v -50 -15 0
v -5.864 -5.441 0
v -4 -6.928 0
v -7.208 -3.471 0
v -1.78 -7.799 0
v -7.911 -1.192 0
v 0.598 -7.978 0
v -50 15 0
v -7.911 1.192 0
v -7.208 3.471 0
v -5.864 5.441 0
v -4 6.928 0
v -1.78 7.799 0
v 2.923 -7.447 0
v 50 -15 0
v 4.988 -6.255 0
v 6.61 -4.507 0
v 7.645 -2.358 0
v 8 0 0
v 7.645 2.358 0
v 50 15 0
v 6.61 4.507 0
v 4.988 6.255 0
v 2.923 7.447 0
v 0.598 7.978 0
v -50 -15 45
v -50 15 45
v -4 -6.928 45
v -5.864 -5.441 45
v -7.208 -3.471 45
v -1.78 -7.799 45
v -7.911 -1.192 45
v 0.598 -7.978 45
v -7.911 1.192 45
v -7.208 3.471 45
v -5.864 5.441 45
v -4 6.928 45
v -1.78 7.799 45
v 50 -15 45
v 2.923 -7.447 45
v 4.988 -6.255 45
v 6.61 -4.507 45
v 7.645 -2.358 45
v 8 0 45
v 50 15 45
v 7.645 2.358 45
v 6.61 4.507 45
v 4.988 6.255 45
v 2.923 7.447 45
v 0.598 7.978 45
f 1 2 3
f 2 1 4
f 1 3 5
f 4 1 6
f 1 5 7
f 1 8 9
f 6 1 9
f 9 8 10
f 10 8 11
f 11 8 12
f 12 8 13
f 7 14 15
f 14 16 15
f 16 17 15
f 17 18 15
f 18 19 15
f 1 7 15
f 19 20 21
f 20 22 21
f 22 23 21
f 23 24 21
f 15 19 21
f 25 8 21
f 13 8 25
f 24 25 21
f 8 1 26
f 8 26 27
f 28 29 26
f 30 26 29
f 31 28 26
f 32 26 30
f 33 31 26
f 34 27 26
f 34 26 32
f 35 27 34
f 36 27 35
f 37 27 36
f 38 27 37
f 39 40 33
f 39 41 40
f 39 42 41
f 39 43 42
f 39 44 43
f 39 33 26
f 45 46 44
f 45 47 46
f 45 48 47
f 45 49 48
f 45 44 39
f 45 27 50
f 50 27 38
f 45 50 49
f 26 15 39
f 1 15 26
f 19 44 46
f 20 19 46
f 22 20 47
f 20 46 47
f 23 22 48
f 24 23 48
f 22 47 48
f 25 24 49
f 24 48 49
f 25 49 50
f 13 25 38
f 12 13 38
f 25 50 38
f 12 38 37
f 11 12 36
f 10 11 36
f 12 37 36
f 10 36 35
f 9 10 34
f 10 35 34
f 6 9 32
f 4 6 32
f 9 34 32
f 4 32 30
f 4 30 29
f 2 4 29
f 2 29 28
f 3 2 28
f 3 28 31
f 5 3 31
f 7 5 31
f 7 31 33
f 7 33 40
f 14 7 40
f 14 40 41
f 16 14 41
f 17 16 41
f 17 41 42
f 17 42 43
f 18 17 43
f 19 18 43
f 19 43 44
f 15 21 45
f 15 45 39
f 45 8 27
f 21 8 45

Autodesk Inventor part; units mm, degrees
ref_plane "YZ Plane" through (0, 0, 0) normal (1, 0, 0) x (0, 1, 0)
ref_plane "XZ Plane" through (0, 0, 0) normal (0, 1, 0) x (-1, 0, 0)
ref_plane "XY Plane" through (0, 0, 0) normal (0, 0, 1) x (1, 0, 0)
sketch "Sketch1" plane through (0, 0, 0) normal (0, 0, 1) x (1, 0, 0)
  line L0 (-50, 15) -> (50, 15)
  line L1 (50, 15) -> (50, -15)
  line L2 (50, -15) -> (-50, -15)
  line L3 (-50, -15) -> (-50, 15)
  point P0 (0, 0)
  point P1 (50, 0)
  point P2 (0, 15)
  dimension "d0" = 100
  dimension "d1" = 30
extrude "Extrusion1" add sketch "Sketch1" along normal blind 45
sketch "Sketch2" plane through (0, 0, 45) normal (0, 0, 1) x (1, 0, 0)
  circle A0 centre (0, 0) radius 8
  dimension "d4" = 16
extrude "Extrusion2" cut sketch "Sketch2" against normal through all
properties part number "lead-screw-nut-preview"
